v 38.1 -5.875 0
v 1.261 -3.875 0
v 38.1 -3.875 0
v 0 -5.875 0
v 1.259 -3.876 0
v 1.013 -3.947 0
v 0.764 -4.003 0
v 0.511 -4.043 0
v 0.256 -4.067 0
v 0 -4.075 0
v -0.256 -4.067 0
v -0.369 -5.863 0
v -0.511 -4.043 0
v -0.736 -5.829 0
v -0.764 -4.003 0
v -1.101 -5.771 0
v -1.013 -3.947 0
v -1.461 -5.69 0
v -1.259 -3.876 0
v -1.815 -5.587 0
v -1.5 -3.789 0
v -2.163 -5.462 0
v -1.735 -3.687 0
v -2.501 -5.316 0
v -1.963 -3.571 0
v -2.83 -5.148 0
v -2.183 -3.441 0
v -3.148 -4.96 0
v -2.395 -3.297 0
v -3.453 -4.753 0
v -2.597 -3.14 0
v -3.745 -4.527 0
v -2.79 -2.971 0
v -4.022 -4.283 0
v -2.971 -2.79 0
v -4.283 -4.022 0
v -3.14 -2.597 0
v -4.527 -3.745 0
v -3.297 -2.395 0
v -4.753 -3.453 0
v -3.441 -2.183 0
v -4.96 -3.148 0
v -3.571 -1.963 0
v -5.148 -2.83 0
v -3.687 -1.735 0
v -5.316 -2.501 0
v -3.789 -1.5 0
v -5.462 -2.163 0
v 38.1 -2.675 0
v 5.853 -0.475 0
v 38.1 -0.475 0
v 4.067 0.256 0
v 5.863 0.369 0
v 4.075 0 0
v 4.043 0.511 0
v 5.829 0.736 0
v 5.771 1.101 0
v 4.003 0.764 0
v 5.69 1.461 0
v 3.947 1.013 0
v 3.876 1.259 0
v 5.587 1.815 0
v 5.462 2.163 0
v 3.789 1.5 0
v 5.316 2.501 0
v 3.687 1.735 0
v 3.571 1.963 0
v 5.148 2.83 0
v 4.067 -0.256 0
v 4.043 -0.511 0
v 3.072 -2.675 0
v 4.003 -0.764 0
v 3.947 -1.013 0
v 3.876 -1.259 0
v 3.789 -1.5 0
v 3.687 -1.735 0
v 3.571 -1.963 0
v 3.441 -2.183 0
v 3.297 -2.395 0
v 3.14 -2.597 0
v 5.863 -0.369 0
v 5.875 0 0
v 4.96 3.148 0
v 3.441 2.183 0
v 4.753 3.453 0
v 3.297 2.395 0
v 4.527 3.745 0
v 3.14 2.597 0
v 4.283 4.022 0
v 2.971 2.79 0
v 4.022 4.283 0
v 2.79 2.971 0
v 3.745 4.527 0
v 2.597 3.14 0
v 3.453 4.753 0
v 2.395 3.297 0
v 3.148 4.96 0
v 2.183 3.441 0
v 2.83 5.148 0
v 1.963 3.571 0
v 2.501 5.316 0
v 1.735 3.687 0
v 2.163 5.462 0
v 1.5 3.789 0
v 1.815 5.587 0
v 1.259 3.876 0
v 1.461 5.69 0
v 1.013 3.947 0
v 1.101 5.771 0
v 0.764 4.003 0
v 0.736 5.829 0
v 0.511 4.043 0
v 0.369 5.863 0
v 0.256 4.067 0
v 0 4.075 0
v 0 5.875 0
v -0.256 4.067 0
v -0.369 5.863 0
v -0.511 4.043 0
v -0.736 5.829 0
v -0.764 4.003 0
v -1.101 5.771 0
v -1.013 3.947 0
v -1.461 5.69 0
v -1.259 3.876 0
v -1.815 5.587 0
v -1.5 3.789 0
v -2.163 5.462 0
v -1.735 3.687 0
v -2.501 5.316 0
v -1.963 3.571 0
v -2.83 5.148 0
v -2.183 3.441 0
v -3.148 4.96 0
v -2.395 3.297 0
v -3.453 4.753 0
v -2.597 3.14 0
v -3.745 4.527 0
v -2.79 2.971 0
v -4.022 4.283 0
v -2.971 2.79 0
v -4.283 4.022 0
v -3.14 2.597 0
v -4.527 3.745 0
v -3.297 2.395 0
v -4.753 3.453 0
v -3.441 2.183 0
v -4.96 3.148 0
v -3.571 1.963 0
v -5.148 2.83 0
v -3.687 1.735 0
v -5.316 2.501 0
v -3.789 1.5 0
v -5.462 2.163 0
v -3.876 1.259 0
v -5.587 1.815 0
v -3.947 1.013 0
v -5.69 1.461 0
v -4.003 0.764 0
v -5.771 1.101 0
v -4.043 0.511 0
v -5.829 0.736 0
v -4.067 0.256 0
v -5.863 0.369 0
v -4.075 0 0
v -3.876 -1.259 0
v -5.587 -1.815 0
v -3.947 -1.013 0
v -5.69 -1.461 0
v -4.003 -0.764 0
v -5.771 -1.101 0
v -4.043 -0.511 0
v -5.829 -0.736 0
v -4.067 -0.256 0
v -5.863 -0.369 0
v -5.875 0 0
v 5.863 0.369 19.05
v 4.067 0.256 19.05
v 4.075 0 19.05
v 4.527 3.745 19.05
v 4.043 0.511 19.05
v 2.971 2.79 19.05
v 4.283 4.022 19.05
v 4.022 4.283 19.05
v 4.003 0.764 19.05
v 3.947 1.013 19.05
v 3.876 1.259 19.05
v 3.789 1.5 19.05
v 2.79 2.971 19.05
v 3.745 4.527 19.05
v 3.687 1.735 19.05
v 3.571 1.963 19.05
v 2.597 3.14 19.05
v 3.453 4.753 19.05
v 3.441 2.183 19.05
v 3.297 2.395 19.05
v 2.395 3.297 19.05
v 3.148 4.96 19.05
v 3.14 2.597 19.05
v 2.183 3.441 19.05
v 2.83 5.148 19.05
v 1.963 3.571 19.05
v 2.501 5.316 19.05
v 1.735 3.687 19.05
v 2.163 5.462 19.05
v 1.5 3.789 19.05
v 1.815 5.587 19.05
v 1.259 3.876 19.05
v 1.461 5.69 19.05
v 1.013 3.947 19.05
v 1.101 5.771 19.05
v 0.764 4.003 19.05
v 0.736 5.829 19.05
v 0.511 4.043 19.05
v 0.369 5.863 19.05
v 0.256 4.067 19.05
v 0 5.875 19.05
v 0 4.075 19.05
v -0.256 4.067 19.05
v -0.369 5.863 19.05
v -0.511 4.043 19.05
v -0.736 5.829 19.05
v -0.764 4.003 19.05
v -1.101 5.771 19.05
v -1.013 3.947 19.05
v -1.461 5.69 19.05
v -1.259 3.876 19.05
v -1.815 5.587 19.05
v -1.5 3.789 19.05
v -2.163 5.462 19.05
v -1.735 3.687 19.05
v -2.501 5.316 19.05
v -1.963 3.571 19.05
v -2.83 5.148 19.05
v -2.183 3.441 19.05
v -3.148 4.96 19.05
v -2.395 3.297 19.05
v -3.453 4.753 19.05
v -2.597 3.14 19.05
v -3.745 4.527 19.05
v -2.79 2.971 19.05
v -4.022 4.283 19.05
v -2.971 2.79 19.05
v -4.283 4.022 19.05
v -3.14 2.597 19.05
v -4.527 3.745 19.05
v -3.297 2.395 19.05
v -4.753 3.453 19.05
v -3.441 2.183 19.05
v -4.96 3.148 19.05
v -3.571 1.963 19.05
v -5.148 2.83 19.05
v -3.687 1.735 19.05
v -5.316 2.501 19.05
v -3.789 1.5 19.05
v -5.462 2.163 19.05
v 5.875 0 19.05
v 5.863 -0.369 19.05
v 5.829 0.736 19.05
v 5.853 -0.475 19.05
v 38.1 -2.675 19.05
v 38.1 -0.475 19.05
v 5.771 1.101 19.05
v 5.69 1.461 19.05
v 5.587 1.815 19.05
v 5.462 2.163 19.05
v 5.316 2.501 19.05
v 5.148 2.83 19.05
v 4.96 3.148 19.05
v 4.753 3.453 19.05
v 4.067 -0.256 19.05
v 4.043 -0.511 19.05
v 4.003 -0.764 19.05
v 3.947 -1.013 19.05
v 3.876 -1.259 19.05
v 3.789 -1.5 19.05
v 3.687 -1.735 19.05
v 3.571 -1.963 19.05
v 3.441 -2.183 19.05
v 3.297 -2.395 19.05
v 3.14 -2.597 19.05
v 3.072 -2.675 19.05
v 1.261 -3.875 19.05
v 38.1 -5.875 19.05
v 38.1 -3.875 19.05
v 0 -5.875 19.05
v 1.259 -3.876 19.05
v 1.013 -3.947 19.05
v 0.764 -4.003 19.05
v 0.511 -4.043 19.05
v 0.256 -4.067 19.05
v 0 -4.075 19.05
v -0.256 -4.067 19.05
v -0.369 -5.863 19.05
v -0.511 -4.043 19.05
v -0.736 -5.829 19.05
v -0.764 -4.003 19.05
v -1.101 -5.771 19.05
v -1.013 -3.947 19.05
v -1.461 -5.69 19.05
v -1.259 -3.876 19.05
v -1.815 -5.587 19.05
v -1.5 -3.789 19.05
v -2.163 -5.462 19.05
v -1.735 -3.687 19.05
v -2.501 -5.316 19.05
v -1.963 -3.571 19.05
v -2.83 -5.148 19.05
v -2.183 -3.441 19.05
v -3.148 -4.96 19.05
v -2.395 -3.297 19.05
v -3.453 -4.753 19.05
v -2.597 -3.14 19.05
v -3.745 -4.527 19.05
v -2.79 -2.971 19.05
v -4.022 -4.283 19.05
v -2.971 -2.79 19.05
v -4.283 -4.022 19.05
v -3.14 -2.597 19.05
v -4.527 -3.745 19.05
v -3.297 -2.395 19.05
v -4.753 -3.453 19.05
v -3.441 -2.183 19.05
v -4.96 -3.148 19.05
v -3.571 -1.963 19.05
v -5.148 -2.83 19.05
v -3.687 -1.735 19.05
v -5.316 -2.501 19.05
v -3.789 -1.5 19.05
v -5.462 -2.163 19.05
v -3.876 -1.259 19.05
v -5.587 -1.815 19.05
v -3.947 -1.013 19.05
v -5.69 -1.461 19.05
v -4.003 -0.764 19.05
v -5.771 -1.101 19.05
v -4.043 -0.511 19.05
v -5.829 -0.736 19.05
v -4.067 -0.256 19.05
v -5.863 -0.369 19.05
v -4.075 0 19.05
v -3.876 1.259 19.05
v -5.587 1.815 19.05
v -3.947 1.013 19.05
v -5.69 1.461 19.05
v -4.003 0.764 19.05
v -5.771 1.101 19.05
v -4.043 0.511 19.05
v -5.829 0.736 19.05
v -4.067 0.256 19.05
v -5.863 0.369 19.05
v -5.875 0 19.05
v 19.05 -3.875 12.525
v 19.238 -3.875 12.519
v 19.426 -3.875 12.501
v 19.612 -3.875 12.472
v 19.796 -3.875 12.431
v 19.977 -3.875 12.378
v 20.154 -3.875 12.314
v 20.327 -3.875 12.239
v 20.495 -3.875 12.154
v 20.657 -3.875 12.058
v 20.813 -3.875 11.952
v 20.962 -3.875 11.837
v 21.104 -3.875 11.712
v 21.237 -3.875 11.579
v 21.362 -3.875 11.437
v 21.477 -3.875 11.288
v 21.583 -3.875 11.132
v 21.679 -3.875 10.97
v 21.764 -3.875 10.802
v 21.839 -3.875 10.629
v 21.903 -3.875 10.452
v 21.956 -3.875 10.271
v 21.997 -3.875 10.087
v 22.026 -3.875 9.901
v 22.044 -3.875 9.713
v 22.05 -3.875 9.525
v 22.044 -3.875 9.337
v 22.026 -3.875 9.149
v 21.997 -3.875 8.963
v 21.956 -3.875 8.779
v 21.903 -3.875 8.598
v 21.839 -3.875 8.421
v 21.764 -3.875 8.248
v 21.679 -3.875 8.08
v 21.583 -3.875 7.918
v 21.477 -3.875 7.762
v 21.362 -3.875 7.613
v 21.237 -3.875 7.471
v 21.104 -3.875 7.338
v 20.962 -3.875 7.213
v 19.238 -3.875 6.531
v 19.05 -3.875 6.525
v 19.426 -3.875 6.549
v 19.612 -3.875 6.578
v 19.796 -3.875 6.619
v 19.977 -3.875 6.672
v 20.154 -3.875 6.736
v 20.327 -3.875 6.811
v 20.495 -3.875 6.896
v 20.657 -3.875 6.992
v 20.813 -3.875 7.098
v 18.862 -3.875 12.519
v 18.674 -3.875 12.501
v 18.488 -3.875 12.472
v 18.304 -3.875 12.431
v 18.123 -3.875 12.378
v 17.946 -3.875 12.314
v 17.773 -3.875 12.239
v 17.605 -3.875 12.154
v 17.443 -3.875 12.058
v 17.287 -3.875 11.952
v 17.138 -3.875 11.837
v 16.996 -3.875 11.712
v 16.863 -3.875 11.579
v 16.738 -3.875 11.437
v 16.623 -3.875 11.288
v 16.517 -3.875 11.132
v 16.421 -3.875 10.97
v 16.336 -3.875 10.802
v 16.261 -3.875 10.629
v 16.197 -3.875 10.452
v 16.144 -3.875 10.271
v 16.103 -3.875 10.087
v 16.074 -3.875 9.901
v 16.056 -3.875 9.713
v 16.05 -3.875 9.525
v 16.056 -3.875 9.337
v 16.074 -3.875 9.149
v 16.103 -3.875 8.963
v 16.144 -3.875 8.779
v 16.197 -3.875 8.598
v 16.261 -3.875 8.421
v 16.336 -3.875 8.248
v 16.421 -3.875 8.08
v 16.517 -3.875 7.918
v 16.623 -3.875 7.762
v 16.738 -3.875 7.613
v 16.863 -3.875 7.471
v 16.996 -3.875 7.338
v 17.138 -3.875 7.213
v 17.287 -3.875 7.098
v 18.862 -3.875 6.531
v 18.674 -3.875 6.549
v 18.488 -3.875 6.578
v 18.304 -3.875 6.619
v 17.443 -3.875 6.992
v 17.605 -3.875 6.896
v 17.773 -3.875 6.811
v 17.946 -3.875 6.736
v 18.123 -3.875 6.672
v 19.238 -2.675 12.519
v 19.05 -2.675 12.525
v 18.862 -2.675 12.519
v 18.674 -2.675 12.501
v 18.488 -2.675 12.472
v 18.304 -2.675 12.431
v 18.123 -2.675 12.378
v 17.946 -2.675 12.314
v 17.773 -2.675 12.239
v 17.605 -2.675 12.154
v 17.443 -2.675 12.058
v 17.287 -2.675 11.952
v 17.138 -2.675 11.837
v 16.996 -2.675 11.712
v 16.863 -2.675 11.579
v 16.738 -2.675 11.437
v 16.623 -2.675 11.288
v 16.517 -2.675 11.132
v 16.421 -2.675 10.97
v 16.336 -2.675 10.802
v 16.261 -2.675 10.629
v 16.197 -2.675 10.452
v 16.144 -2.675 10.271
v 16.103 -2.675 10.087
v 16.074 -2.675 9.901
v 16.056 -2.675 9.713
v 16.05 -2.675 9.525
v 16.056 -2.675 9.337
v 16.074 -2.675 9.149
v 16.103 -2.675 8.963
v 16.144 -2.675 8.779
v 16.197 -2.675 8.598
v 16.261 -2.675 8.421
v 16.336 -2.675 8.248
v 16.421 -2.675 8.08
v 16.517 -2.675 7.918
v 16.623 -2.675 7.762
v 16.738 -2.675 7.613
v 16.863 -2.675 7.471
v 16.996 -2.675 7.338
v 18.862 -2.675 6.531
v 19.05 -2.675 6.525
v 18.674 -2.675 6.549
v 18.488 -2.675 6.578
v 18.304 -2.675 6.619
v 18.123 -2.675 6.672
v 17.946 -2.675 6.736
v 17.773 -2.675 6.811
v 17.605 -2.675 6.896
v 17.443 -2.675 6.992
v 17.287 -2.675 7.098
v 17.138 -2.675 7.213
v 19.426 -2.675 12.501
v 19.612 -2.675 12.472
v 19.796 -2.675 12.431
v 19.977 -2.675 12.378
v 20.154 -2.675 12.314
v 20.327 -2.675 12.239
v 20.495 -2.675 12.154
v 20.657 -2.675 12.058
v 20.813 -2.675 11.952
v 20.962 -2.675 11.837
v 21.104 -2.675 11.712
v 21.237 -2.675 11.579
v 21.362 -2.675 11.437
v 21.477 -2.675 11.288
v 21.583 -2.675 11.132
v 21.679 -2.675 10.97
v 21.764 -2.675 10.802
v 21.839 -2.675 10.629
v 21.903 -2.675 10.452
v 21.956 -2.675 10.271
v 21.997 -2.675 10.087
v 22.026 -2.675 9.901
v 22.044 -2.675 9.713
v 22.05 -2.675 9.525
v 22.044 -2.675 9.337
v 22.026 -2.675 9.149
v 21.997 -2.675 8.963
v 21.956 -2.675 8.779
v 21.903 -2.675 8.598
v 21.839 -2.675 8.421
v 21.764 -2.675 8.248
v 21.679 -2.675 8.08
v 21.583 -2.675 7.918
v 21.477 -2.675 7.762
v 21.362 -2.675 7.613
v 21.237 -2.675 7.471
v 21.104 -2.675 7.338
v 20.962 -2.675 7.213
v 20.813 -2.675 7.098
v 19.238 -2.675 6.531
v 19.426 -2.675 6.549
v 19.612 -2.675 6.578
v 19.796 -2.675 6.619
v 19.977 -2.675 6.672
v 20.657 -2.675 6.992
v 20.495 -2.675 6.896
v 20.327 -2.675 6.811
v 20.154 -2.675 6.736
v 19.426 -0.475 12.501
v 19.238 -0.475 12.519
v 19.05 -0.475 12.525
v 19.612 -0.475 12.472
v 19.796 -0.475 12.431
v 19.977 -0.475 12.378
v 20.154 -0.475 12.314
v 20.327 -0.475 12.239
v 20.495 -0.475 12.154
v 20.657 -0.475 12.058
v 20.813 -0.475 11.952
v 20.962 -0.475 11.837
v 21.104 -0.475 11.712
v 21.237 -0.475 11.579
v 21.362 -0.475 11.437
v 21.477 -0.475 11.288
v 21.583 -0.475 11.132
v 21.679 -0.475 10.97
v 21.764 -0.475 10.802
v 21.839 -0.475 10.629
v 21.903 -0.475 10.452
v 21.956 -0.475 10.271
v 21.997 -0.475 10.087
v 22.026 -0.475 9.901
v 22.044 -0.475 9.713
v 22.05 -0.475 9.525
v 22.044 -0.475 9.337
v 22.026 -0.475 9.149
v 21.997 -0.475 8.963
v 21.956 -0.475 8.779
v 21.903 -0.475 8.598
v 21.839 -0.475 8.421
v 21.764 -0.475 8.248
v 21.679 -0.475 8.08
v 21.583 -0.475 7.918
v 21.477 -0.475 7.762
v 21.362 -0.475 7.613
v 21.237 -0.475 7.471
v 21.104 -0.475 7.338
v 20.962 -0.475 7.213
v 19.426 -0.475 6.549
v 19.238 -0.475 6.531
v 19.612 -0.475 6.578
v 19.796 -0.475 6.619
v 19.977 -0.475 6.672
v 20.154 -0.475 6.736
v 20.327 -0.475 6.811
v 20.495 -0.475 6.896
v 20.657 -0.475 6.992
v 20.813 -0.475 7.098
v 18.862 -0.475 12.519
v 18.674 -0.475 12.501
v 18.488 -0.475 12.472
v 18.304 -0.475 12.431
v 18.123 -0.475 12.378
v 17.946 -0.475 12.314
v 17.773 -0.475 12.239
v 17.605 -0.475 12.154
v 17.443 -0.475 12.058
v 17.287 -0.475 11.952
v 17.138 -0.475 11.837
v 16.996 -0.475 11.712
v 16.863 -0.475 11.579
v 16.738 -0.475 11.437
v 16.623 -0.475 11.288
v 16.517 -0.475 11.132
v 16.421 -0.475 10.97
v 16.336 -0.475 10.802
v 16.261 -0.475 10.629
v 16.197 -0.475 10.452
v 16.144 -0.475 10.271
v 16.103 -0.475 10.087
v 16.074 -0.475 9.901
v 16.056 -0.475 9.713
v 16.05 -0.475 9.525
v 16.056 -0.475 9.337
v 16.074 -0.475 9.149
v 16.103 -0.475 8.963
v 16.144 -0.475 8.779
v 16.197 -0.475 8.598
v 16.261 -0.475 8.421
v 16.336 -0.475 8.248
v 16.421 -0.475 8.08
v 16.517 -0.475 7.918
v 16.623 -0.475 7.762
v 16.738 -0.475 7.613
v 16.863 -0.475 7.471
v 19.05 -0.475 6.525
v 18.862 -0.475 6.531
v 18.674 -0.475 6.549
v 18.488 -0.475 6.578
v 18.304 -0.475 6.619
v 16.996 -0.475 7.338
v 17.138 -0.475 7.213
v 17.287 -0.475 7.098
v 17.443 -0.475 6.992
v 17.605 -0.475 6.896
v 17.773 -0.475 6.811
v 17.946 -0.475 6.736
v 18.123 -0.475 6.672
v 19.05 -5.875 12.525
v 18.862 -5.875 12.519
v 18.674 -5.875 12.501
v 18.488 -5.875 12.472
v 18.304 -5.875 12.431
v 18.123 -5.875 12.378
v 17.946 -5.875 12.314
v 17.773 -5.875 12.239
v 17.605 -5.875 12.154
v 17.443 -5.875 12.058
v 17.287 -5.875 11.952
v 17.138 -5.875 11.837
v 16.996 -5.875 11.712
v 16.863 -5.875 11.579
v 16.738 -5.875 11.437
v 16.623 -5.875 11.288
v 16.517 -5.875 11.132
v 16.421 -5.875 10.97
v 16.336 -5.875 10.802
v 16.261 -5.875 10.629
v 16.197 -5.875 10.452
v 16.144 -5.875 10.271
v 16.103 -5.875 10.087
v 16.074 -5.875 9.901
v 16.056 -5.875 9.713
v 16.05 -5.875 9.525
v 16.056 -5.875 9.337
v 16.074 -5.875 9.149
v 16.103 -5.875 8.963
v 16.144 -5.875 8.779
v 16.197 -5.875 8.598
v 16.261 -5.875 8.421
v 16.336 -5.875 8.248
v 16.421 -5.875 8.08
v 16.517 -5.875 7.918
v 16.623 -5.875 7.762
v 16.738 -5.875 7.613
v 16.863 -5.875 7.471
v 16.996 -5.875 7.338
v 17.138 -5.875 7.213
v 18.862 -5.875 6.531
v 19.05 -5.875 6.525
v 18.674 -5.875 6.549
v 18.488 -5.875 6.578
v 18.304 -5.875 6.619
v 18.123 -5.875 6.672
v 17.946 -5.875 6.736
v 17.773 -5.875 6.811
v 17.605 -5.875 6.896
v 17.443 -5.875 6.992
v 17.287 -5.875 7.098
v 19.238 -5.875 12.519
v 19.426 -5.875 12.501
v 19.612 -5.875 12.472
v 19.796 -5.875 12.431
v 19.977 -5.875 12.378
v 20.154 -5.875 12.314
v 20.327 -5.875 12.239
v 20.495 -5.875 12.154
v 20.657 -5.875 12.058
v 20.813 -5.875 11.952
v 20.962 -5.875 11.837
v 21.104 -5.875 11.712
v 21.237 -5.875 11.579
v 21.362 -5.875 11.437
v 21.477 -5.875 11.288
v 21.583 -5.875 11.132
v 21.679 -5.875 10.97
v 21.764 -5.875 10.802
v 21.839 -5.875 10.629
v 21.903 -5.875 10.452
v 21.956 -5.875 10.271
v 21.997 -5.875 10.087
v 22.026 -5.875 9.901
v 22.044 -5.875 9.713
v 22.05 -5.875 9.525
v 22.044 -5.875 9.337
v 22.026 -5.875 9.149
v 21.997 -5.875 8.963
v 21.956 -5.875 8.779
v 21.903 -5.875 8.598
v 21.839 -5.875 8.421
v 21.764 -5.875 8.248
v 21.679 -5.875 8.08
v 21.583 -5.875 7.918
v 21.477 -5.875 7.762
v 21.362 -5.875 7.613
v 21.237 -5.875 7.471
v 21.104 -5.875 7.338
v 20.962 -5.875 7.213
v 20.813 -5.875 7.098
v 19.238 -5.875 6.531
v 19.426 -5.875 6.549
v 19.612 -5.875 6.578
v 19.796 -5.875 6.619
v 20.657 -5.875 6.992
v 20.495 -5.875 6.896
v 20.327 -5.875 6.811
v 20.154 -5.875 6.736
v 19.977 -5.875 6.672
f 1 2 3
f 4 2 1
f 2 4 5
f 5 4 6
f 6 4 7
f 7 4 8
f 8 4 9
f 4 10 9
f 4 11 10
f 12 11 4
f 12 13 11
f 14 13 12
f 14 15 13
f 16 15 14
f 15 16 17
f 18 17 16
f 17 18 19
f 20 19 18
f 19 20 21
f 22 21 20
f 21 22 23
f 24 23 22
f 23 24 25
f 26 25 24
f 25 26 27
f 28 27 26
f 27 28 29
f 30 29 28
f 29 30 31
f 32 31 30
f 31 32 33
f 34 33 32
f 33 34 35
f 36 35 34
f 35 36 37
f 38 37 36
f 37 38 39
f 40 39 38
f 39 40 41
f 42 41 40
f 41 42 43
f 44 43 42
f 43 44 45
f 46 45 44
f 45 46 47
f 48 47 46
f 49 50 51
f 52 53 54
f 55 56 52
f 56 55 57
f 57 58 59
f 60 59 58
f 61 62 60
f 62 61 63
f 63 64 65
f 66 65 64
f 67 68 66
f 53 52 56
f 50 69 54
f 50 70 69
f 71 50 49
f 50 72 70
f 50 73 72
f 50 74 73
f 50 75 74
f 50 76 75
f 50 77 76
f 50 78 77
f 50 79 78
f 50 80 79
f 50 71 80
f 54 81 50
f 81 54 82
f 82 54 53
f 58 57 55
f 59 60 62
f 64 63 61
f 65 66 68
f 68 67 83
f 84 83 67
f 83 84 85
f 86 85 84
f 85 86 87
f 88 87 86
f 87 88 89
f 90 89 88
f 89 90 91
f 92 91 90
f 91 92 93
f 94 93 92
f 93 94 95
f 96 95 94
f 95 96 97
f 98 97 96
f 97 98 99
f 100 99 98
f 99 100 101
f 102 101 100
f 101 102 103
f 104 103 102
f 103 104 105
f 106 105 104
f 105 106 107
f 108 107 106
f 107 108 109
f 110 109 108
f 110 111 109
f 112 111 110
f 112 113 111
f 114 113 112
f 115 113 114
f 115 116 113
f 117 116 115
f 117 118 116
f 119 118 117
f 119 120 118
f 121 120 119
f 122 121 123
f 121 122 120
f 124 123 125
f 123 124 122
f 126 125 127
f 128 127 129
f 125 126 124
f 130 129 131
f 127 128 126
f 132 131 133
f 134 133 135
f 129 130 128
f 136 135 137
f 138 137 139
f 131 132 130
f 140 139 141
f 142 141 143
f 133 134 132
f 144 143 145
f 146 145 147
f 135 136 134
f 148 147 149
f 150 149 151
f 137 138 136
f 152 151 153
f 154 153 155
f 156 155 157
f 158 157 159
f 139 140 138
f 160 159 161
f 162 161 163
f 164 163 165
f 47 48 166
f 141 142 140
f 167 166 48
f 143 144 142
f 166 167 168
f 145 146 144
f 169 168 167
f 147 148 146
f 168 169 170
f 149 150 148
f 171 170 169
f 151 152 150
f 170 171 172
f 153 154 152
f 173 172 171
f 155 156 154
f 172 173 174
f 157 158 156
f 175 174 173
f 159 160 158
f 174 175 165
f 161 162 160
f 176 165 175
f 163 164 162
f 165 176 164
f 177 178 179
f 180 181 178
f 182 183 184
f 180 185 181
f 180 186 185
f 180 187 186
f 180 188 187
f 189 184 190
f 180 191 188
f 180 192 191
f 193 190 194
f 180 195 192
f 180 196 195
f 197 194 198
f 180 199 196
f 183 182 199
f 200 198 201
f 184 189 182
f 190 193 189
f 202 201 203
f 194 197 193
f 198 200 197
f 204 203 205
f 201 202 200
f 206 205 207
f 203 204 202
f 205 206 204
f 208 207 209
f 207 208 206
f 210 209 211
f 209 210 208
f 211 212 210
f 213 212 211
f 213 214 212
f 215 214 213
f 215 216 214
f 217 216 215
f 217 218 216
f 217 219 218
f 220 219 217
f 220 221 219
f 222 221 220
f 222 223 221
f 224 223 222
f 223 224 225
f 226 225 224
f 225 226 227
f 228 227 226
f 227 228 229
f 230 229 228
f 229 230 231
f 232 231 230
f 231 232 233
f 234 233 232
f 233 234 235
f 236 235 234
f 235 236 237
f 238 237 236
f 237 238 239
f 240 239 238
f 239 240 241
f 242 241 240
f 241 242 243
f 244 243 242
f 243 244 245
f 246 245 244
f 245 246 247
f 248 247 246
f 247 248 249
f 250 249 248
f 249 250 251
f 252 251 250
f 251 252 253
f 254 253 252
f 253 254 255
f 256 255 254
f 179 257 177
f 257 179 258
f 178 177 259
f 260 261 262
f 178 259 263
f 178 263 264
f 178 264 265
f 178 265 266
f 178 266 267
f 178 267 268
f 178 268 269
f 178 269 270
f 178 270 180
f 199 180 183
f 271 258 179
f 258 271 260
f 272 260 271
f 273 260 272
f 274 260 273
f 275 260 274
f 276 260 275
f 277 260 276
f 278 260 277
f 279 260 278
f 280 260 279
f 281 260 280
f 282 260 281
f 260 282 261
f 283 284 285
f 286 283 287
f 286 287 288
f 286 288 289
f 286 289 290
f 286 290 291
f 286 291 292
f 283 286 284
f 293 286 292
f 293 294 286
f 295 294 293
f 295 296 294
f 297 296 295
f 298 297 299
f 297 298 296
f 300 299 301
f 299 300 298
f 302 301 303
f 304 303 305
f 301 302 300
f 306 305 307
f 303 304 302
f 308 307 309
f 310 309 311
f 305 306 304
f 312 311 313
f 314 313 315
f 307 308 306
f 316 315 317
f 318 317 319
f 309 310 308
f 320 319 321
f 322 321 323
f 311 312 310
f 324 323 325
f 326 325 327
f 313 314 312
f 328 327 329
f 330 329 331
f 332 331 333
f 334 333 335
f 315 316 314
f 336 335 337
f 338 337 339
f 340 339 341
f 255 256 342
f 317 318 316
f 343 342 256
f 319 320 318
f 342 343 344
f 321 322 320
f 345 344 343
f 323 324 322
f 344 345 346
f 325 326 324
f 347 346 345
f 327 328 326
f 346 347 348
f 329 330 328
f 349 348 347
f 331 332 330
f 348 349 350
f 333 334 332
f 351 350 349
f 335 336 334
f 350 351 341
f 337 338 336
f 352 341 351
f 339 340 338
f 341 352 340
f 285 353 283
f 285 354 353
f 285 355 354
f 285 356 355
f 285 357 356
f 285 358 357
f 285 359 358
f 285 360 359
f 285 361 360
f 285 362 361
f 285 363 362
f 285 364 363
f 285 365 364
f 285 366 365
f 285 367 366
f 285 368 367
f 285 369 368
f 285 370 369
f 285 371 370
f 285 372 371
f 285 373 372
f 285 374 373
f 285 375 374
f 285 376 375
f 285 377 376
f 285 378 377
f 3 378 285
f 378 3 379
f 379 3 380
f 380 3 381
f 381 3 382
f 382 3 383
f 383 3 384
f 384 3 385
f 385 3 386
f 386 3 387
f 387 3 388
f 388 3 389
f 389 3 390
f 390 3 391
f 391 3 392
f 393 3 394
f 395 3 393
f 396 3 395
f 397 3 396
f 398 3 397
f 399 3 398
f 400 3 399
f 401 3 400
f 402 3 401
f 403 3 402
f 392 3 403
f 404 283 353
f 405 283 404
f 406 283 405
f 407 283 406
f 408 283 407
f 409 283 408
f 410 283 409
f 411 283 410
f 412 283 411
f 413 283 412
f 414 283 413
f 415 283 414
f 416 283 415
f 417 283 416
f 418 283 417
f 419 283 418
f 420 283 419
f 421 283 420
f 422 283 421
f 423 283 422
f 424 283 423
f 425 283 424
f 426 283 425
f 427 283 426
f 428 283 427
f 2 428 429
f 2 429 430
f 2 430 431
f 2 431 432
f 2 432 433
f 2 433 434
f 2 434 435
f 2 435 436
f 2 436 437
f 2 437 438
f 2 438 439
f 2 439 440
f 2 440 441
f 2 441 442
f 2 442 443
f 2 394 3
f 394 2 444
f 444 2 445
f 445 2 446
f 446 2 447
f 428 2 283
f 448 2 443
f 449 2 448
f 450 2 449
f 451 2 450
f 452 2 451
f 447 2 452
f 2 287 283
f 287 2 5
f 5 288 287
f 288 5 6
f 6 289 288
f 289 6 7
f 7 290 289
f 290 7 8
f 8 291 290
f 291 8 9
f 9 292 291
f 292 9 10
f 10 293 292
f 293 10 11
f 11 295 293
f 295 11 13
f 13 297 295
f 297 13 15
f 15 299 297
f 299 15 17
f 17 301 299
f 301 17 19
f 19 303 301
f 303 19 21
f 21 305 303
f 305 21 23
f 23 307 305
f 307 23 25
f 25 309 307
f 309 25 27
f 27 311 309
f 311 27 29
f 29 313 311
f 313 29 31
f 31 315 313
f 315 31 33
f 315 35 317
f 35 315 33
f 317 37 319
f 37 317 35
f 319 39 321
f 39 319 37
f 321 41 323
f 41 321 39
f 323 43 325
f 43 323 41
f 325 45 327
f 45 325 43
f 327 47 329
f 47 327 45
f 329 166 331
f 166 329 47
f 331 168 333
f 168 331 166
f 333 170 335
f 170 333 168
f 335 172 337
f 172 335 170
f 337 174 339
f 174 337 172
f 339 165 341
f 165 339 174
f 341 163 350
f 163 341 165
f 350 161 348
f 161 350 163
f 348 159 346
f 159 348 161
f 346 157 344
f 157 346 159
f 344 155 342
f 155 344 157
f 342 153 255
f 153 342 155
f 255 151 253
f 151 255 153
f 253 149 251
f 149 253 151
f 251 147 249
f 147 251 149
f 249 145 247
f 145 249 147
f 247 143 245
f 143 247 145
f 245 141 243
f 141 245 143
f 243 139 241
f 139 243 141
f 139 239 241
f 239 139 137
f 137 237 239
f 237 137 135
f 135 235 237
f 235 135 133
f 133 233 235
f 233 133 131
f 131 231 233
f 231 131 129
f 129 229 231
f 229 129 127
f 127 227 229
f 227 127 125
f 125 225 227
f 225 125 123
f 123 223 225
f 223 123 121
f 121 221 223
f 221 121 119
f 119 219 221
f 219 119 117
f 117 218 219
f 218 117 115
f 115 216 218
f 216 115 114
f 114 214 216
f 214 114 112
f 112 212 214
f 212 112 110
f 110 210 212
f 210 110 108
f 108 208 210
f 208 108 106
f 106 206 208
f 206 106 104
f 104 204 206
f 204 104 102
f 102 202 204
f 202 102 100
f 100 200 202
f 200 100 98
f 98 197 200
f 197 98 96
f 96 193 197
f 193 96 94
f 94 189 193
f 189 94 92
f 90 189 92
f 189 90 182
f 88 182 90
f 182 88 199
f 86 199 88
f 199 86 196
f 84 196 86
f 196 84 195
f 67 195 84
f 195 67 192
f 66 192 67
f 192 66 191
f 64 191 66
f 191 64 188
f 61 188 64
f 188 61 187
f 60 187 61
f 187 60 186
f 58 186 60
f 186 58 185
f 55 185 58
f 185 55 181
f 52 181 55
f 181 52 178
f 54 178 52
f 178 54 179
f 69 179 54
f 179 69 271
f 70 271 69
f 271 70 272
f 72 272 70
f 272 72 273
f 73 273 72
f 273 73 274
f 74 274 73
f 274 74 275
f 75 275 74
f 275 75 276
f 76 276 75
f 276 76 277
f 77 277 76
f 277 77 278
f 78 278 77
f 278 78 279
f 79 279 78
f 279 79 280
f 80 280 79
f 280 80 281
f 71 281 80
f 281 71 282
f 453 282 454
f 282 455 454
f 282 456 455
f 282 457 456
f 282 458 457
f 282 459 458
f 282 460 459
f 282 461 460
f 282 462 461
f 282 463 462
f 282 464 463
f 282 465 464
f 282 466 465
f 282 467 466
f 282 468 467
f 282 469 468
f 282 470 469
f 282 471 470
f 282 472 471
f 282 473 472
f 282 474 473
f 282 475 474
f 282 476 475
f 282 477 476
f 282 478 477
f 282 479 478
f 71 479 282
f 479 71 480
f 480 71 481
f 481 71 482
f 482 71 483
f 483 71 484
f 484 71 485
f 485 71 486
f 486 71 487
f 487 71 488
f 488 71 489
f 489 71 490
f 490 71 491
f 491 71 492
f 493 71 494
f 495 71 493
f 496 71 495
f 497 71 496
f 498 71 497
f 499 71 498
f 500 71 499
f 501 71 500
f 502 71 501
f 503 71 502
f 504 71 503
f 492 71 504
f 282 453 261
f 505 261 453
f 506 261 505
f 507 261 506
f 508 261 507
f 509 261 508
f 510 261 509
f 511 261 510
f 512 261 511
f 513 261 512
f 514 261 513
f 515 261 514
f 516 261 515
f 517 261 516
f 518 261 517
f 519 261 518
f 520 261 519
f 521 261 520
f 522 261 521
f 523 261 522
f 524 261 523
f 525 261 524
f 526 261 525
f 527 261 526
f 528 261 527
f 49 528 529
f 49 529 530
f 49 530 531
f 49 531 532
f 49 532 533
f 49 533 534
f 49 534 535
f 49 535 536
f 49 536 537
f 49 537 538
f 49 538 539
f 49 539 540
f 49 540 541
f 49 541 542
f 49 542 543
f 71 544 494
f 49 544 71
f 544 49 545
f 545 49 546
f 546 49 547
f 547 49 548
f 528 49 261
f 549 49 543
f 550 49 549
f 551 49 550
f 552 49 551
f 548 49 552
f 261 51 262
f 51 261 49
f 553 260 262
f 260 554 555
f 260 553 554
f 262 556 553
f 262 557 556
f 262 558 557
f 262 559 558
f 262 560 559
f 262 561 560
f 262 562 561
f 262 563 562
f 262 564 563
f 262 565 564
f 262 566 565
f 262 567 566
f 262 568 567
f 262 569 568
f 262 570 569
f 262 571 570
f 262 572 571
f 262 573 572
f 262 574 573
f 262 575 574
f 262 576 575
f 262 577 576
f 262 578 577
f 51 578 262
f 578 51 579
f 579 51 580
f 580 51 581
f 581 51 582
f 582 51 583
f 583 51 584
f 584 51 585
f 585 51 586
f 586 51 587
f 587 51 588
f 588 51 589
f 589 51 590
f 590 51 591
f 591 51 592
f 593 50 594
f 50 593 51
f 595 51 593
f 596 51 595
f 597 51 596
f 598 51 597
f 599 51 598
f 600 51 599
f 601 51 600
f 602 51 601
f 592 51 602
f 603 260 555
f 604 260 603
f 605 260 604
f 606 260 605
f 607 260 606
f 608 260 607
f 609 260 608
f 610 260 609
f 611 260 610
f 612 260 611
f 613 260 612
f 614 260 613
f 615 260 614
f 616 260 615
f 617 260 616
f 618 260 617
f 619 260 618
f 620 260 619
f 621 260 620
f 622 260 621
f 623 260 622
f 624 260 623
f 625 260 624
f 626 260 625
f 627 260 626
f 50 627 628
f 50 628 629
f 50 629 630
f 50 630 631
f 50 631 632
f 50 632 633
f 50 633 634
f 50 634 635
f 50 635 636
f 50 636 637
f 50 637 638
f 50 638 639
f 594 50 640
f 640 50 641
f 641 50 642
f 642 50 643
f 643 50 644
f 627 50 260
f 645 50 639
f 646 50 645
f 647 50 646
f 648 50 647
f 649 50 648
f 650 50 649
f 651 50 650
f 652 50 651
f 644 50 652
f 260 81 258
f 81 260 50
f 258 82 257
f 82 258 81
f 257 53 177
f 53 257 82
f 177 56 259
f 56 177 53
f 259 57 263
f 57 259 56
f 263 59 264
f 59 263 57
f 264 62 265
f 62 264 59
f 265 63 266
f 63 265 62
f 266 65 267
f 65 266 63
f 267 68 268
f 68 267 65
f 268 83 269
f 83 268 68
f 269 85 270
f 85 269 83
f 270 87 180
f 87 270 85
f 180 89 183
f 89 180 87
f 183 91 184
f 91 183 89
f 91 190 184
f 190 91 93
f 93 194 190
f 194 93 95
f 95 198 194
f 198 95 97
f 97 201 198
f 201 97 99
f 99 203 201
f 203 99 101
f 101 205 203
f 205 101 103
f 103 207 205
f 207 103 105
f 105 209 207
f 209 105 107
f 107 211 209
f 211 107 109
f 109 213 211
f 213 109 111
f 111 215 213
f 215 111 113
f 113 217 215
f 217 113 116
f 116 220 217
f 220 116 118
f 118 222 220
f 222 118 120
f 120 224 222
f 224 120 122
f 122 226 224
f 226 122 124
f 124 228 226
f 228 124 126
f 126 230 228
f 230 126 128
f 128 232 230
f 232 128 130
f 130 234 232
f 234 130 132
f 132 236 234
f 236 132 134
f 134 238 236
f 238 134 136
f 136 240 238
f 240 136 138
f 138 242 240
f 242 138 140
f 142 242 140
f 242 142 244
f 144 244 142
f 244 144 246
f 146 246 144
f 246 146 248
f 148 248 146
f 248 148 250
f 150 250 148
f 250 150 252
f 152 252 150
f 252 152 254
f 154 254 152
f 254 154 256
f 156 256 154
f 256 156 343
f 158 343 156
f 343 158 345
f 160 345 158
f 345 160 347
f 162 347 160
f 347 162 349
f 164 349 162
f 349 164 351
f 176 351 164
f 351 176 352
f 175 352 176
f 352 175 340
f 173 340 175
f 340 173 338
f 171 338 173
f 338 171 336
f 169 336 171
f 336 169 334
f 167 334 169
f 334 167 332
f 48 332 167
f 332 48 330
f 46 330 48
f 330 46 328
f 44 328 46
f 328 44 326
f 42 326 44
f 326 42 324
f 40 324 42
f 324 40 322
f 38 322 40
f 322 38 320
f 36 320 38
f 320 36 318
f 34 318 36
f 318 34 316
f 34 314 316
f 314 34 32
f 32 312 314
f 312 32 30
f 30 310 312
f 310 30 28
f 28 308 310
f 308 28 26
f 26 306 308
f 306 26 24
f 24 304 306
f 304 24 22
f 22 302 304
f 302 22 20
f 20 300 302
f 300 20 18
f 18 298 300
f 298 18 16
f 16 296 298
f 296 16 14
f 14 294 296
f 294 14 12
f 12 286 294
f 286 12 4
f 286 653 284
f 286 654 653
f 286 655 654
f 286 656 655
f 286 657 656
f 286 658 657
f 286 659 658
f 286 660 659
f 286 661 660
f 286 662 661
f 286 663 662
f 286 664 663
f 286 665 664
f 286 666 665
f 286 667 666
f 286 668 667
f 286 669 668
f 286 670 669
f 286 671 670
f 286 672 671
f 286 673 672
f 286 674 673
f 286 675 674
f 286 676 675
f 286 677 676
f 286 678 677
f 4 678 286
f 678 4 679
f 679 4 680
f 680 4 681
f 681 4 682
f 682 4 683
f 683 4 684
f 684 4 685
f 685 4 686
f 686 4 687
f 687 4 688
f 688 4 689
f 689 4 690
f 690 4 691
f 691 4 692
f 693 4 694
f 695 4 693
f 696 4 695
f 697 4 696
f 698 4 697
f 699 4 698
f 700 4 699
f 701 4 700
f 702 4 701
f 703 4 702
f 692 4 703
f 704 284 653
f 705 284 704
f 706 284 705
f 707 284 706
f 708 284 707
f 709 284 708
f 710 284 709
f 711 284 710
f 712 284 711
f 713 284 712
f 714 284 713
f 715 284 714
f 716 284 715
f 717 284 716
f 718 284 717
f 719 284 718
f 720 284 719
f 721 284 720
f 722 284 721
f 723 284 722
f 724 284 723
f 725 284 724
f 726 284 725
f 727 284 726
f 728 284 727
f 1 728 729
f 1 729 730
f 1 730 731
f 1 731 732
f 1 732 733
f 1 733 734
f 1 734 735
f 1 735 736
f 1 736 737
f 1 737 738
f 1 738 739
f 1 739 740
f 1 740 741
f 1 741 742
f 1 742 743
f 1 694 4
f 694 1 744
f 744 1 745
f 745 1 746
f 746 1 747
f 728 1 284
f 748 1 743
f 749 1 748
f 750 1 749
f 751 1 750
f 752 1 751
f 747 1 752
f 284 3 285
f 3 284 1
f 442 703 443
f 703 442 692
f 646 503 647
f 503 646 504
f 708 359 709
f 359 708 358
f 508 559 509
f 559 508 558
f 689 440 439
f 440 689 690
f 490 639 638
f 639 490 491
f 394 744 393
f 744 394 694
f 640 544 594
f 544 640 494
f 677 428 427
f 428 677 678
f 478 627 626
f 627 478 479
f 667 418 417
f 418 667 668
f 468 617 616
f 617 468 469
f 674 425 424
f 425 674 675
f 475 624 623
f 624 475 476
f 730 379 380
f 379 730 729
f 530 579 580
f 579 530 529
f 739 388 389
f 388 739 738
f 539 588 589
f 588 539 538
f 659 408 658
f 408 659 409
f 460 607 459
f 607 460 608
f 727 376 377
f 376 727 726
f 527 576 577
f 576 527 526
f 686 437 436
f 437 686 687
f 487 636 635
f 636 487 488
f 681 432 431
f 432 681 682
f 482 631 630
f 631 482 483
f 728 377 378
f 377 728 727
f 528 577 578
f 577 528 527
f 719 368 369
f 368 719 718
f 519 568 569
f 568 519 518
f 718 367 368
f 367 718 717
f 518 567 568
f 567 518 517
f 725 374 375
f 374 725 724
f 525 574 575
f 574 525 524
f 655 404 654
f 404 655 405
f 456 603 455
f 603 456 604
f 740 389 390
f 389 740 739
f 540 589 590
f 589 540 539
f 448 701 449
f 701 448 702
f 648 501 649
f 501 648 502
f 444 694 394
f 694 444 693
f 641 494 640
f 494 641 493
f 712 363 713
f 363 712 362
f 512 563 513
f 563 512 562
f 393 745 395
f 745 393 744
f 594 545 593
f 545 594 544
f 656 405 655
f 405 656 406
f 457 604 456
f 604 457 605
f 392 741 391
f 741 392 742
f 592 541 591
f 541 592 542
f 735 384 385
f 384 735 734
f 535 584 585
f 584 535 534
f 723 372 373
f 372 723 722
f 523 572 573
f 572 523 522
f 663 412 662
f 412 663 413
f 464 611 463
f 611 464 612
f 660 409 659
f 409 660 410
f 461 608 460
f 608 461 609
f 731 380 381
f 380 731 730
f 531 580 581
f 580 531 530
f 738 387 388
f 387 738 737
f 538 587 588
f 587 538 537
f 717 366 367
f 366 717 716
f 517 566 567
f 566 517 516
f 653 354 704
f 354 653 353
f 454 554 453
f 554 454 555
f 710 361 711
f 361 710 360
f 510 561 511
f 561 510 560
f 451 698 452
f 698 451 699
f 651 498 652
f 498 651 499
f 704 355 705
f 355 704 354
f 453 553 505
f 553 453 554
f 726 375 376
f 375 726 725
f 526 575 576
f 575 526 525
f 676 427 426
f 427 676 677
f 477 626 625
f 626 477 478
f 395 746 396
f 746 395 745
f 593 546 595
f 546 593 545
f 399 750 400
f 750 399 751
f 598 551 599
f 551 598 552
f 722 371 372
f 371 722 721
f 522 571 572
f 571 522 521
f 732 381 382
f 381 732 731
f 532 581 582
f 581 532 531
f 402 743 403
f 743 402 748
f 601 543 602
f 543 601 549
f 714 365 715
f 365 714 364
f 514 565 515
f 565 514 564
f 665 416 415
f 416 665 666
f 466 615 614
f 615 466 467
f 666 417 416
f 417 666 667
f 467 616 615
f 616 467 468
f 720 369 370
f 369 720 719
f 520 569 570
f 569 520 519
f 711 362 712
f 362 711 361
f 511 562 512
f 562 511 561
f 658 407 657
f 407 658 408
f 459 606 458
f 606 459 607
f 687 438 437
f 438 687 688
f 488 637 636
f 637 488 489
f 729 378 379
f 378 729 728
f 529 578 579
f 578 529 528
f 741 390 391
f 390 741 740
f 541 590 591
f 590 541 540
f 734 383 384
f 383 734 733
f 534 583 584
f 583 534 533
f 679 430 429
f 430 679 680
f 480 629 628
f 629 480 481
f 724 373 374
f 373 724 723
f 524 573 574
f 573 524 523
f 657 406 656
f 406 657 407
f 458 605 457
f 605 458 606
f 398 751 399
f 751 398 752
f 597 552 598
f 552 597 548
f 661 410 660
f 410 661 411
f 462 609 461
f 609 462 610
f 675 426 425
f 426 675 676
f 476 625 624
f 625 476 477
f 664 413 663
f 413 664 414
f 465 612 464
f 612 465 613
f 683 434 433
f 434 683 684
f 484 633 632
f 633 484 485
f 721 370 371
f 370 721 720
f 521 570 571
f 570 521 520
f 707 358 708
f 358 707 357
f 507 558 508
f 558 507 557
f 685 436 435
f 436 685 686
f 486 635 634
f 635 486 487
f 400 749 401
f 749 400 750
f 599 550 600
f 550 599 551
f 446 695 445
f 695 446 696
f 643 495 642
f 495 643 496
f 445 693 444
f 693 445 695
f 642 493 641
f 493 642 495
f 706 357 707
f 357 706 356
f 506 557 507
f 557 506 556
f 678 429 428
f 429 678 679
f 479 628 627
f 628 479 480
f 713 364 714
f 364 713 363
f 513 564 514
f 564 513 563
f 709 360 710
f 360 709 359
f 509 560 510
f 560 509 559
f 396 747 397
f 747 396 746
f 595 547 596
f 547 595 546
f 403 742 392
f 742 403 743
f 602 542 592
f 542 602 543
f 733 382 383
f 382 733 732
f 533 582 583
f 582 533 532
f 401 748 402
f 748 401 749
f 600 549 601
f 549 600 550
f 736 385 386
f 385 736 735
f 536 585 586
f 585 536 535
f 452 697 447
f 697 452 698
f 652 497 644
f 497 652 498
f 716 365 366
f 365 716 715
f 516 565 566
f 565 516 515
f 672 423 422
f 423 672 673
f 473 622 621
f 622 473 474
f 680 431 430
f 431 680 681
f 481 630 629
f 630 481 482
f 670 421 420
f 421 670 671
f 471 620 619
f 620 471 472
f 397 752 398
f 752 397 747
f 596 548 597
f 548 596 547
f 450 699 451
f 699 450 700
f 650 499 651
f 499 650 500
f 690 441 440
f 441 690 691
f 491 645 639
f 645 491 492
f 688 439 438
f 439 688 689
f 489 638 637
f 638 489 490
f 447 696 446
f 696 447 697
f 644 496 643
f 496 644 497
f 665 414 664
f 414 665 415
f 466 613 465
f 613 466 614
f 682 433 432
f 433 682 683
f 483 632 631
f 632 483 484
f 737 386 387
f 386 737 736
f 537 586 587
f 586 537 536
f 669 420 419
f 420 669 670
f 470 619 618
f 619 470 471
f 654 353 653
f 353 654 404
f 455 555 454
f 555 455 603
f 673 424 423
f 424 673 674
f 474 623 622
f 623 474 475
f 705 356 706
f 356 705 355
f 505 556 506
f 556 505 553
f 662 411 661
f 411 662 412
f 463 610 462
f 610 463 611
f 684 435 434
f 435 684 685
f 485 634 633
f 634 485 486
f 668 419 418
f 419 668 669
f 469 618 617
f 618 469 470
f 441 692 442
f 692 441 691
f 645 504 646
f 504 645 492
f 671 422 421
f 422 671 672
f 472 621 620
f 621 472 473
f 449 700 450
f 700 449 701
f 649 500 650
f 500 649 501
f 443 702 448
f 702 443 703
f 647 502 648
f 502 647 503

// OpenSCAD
INCH = 25.4;
LineWidth = 0.6;
WallThickness = LineWidth * 3; //
//3/4 poly tubing value is 0.72
Target_Radius = half(Inches(0.25) +  WallThickness); // mm 3/4inch
$fn = 100;

// radius = 20;
// angles = [-80, 270];
// width = 2;
fn = 60;


function half(value) = value/2;
function Inches(value) = INCH * value;
function TailDepthAdjustment(value) = value < 2 ? 0.8 : value /2;
build();

module build(args) 
{
    echo( str("module is ", "P"), Target_Radius=Target_Radius);
    difference()
    {
        PolyPipeClip(radius = Target_Radius, wall = WallThickness, clipLength =  Inches(1.5), clipDepth = WallThickness * 3, height = Inches(0.75));  
    }


}

module PolyPipeClip(radius, wall, clipLength, clipDepth, height=13, screHoleRadius = 3)
{
    difference()
    {
        linear_extrude(height = height)
        difference()
        {
            P(radius+wall, clipLength, clipDepth);         

            P(radius, clipLength, 2*LineWidth);       
        }

        translate([0.5*clipLength,-2,height/2]) rotate([90,0,0]) cylinder(r=screHoleRadius, h=10, center=true);
    }
}

module P(radius, tailLengh, tailDepth)
{
    echo( str("module is ", "P"), radius=radius, wall=TailDepthAdjustment(tailDepth), tailLengh=tailLengh, clipDepth=tailDepth);
    //pipe
    circle(r=radius);
    //clip
    translate([tailLengh/2,-(radius - TailDepthAdjustment(tailDepth) ),0])
    square(size=[tailLengh, tailDepth], center=true);       
}
